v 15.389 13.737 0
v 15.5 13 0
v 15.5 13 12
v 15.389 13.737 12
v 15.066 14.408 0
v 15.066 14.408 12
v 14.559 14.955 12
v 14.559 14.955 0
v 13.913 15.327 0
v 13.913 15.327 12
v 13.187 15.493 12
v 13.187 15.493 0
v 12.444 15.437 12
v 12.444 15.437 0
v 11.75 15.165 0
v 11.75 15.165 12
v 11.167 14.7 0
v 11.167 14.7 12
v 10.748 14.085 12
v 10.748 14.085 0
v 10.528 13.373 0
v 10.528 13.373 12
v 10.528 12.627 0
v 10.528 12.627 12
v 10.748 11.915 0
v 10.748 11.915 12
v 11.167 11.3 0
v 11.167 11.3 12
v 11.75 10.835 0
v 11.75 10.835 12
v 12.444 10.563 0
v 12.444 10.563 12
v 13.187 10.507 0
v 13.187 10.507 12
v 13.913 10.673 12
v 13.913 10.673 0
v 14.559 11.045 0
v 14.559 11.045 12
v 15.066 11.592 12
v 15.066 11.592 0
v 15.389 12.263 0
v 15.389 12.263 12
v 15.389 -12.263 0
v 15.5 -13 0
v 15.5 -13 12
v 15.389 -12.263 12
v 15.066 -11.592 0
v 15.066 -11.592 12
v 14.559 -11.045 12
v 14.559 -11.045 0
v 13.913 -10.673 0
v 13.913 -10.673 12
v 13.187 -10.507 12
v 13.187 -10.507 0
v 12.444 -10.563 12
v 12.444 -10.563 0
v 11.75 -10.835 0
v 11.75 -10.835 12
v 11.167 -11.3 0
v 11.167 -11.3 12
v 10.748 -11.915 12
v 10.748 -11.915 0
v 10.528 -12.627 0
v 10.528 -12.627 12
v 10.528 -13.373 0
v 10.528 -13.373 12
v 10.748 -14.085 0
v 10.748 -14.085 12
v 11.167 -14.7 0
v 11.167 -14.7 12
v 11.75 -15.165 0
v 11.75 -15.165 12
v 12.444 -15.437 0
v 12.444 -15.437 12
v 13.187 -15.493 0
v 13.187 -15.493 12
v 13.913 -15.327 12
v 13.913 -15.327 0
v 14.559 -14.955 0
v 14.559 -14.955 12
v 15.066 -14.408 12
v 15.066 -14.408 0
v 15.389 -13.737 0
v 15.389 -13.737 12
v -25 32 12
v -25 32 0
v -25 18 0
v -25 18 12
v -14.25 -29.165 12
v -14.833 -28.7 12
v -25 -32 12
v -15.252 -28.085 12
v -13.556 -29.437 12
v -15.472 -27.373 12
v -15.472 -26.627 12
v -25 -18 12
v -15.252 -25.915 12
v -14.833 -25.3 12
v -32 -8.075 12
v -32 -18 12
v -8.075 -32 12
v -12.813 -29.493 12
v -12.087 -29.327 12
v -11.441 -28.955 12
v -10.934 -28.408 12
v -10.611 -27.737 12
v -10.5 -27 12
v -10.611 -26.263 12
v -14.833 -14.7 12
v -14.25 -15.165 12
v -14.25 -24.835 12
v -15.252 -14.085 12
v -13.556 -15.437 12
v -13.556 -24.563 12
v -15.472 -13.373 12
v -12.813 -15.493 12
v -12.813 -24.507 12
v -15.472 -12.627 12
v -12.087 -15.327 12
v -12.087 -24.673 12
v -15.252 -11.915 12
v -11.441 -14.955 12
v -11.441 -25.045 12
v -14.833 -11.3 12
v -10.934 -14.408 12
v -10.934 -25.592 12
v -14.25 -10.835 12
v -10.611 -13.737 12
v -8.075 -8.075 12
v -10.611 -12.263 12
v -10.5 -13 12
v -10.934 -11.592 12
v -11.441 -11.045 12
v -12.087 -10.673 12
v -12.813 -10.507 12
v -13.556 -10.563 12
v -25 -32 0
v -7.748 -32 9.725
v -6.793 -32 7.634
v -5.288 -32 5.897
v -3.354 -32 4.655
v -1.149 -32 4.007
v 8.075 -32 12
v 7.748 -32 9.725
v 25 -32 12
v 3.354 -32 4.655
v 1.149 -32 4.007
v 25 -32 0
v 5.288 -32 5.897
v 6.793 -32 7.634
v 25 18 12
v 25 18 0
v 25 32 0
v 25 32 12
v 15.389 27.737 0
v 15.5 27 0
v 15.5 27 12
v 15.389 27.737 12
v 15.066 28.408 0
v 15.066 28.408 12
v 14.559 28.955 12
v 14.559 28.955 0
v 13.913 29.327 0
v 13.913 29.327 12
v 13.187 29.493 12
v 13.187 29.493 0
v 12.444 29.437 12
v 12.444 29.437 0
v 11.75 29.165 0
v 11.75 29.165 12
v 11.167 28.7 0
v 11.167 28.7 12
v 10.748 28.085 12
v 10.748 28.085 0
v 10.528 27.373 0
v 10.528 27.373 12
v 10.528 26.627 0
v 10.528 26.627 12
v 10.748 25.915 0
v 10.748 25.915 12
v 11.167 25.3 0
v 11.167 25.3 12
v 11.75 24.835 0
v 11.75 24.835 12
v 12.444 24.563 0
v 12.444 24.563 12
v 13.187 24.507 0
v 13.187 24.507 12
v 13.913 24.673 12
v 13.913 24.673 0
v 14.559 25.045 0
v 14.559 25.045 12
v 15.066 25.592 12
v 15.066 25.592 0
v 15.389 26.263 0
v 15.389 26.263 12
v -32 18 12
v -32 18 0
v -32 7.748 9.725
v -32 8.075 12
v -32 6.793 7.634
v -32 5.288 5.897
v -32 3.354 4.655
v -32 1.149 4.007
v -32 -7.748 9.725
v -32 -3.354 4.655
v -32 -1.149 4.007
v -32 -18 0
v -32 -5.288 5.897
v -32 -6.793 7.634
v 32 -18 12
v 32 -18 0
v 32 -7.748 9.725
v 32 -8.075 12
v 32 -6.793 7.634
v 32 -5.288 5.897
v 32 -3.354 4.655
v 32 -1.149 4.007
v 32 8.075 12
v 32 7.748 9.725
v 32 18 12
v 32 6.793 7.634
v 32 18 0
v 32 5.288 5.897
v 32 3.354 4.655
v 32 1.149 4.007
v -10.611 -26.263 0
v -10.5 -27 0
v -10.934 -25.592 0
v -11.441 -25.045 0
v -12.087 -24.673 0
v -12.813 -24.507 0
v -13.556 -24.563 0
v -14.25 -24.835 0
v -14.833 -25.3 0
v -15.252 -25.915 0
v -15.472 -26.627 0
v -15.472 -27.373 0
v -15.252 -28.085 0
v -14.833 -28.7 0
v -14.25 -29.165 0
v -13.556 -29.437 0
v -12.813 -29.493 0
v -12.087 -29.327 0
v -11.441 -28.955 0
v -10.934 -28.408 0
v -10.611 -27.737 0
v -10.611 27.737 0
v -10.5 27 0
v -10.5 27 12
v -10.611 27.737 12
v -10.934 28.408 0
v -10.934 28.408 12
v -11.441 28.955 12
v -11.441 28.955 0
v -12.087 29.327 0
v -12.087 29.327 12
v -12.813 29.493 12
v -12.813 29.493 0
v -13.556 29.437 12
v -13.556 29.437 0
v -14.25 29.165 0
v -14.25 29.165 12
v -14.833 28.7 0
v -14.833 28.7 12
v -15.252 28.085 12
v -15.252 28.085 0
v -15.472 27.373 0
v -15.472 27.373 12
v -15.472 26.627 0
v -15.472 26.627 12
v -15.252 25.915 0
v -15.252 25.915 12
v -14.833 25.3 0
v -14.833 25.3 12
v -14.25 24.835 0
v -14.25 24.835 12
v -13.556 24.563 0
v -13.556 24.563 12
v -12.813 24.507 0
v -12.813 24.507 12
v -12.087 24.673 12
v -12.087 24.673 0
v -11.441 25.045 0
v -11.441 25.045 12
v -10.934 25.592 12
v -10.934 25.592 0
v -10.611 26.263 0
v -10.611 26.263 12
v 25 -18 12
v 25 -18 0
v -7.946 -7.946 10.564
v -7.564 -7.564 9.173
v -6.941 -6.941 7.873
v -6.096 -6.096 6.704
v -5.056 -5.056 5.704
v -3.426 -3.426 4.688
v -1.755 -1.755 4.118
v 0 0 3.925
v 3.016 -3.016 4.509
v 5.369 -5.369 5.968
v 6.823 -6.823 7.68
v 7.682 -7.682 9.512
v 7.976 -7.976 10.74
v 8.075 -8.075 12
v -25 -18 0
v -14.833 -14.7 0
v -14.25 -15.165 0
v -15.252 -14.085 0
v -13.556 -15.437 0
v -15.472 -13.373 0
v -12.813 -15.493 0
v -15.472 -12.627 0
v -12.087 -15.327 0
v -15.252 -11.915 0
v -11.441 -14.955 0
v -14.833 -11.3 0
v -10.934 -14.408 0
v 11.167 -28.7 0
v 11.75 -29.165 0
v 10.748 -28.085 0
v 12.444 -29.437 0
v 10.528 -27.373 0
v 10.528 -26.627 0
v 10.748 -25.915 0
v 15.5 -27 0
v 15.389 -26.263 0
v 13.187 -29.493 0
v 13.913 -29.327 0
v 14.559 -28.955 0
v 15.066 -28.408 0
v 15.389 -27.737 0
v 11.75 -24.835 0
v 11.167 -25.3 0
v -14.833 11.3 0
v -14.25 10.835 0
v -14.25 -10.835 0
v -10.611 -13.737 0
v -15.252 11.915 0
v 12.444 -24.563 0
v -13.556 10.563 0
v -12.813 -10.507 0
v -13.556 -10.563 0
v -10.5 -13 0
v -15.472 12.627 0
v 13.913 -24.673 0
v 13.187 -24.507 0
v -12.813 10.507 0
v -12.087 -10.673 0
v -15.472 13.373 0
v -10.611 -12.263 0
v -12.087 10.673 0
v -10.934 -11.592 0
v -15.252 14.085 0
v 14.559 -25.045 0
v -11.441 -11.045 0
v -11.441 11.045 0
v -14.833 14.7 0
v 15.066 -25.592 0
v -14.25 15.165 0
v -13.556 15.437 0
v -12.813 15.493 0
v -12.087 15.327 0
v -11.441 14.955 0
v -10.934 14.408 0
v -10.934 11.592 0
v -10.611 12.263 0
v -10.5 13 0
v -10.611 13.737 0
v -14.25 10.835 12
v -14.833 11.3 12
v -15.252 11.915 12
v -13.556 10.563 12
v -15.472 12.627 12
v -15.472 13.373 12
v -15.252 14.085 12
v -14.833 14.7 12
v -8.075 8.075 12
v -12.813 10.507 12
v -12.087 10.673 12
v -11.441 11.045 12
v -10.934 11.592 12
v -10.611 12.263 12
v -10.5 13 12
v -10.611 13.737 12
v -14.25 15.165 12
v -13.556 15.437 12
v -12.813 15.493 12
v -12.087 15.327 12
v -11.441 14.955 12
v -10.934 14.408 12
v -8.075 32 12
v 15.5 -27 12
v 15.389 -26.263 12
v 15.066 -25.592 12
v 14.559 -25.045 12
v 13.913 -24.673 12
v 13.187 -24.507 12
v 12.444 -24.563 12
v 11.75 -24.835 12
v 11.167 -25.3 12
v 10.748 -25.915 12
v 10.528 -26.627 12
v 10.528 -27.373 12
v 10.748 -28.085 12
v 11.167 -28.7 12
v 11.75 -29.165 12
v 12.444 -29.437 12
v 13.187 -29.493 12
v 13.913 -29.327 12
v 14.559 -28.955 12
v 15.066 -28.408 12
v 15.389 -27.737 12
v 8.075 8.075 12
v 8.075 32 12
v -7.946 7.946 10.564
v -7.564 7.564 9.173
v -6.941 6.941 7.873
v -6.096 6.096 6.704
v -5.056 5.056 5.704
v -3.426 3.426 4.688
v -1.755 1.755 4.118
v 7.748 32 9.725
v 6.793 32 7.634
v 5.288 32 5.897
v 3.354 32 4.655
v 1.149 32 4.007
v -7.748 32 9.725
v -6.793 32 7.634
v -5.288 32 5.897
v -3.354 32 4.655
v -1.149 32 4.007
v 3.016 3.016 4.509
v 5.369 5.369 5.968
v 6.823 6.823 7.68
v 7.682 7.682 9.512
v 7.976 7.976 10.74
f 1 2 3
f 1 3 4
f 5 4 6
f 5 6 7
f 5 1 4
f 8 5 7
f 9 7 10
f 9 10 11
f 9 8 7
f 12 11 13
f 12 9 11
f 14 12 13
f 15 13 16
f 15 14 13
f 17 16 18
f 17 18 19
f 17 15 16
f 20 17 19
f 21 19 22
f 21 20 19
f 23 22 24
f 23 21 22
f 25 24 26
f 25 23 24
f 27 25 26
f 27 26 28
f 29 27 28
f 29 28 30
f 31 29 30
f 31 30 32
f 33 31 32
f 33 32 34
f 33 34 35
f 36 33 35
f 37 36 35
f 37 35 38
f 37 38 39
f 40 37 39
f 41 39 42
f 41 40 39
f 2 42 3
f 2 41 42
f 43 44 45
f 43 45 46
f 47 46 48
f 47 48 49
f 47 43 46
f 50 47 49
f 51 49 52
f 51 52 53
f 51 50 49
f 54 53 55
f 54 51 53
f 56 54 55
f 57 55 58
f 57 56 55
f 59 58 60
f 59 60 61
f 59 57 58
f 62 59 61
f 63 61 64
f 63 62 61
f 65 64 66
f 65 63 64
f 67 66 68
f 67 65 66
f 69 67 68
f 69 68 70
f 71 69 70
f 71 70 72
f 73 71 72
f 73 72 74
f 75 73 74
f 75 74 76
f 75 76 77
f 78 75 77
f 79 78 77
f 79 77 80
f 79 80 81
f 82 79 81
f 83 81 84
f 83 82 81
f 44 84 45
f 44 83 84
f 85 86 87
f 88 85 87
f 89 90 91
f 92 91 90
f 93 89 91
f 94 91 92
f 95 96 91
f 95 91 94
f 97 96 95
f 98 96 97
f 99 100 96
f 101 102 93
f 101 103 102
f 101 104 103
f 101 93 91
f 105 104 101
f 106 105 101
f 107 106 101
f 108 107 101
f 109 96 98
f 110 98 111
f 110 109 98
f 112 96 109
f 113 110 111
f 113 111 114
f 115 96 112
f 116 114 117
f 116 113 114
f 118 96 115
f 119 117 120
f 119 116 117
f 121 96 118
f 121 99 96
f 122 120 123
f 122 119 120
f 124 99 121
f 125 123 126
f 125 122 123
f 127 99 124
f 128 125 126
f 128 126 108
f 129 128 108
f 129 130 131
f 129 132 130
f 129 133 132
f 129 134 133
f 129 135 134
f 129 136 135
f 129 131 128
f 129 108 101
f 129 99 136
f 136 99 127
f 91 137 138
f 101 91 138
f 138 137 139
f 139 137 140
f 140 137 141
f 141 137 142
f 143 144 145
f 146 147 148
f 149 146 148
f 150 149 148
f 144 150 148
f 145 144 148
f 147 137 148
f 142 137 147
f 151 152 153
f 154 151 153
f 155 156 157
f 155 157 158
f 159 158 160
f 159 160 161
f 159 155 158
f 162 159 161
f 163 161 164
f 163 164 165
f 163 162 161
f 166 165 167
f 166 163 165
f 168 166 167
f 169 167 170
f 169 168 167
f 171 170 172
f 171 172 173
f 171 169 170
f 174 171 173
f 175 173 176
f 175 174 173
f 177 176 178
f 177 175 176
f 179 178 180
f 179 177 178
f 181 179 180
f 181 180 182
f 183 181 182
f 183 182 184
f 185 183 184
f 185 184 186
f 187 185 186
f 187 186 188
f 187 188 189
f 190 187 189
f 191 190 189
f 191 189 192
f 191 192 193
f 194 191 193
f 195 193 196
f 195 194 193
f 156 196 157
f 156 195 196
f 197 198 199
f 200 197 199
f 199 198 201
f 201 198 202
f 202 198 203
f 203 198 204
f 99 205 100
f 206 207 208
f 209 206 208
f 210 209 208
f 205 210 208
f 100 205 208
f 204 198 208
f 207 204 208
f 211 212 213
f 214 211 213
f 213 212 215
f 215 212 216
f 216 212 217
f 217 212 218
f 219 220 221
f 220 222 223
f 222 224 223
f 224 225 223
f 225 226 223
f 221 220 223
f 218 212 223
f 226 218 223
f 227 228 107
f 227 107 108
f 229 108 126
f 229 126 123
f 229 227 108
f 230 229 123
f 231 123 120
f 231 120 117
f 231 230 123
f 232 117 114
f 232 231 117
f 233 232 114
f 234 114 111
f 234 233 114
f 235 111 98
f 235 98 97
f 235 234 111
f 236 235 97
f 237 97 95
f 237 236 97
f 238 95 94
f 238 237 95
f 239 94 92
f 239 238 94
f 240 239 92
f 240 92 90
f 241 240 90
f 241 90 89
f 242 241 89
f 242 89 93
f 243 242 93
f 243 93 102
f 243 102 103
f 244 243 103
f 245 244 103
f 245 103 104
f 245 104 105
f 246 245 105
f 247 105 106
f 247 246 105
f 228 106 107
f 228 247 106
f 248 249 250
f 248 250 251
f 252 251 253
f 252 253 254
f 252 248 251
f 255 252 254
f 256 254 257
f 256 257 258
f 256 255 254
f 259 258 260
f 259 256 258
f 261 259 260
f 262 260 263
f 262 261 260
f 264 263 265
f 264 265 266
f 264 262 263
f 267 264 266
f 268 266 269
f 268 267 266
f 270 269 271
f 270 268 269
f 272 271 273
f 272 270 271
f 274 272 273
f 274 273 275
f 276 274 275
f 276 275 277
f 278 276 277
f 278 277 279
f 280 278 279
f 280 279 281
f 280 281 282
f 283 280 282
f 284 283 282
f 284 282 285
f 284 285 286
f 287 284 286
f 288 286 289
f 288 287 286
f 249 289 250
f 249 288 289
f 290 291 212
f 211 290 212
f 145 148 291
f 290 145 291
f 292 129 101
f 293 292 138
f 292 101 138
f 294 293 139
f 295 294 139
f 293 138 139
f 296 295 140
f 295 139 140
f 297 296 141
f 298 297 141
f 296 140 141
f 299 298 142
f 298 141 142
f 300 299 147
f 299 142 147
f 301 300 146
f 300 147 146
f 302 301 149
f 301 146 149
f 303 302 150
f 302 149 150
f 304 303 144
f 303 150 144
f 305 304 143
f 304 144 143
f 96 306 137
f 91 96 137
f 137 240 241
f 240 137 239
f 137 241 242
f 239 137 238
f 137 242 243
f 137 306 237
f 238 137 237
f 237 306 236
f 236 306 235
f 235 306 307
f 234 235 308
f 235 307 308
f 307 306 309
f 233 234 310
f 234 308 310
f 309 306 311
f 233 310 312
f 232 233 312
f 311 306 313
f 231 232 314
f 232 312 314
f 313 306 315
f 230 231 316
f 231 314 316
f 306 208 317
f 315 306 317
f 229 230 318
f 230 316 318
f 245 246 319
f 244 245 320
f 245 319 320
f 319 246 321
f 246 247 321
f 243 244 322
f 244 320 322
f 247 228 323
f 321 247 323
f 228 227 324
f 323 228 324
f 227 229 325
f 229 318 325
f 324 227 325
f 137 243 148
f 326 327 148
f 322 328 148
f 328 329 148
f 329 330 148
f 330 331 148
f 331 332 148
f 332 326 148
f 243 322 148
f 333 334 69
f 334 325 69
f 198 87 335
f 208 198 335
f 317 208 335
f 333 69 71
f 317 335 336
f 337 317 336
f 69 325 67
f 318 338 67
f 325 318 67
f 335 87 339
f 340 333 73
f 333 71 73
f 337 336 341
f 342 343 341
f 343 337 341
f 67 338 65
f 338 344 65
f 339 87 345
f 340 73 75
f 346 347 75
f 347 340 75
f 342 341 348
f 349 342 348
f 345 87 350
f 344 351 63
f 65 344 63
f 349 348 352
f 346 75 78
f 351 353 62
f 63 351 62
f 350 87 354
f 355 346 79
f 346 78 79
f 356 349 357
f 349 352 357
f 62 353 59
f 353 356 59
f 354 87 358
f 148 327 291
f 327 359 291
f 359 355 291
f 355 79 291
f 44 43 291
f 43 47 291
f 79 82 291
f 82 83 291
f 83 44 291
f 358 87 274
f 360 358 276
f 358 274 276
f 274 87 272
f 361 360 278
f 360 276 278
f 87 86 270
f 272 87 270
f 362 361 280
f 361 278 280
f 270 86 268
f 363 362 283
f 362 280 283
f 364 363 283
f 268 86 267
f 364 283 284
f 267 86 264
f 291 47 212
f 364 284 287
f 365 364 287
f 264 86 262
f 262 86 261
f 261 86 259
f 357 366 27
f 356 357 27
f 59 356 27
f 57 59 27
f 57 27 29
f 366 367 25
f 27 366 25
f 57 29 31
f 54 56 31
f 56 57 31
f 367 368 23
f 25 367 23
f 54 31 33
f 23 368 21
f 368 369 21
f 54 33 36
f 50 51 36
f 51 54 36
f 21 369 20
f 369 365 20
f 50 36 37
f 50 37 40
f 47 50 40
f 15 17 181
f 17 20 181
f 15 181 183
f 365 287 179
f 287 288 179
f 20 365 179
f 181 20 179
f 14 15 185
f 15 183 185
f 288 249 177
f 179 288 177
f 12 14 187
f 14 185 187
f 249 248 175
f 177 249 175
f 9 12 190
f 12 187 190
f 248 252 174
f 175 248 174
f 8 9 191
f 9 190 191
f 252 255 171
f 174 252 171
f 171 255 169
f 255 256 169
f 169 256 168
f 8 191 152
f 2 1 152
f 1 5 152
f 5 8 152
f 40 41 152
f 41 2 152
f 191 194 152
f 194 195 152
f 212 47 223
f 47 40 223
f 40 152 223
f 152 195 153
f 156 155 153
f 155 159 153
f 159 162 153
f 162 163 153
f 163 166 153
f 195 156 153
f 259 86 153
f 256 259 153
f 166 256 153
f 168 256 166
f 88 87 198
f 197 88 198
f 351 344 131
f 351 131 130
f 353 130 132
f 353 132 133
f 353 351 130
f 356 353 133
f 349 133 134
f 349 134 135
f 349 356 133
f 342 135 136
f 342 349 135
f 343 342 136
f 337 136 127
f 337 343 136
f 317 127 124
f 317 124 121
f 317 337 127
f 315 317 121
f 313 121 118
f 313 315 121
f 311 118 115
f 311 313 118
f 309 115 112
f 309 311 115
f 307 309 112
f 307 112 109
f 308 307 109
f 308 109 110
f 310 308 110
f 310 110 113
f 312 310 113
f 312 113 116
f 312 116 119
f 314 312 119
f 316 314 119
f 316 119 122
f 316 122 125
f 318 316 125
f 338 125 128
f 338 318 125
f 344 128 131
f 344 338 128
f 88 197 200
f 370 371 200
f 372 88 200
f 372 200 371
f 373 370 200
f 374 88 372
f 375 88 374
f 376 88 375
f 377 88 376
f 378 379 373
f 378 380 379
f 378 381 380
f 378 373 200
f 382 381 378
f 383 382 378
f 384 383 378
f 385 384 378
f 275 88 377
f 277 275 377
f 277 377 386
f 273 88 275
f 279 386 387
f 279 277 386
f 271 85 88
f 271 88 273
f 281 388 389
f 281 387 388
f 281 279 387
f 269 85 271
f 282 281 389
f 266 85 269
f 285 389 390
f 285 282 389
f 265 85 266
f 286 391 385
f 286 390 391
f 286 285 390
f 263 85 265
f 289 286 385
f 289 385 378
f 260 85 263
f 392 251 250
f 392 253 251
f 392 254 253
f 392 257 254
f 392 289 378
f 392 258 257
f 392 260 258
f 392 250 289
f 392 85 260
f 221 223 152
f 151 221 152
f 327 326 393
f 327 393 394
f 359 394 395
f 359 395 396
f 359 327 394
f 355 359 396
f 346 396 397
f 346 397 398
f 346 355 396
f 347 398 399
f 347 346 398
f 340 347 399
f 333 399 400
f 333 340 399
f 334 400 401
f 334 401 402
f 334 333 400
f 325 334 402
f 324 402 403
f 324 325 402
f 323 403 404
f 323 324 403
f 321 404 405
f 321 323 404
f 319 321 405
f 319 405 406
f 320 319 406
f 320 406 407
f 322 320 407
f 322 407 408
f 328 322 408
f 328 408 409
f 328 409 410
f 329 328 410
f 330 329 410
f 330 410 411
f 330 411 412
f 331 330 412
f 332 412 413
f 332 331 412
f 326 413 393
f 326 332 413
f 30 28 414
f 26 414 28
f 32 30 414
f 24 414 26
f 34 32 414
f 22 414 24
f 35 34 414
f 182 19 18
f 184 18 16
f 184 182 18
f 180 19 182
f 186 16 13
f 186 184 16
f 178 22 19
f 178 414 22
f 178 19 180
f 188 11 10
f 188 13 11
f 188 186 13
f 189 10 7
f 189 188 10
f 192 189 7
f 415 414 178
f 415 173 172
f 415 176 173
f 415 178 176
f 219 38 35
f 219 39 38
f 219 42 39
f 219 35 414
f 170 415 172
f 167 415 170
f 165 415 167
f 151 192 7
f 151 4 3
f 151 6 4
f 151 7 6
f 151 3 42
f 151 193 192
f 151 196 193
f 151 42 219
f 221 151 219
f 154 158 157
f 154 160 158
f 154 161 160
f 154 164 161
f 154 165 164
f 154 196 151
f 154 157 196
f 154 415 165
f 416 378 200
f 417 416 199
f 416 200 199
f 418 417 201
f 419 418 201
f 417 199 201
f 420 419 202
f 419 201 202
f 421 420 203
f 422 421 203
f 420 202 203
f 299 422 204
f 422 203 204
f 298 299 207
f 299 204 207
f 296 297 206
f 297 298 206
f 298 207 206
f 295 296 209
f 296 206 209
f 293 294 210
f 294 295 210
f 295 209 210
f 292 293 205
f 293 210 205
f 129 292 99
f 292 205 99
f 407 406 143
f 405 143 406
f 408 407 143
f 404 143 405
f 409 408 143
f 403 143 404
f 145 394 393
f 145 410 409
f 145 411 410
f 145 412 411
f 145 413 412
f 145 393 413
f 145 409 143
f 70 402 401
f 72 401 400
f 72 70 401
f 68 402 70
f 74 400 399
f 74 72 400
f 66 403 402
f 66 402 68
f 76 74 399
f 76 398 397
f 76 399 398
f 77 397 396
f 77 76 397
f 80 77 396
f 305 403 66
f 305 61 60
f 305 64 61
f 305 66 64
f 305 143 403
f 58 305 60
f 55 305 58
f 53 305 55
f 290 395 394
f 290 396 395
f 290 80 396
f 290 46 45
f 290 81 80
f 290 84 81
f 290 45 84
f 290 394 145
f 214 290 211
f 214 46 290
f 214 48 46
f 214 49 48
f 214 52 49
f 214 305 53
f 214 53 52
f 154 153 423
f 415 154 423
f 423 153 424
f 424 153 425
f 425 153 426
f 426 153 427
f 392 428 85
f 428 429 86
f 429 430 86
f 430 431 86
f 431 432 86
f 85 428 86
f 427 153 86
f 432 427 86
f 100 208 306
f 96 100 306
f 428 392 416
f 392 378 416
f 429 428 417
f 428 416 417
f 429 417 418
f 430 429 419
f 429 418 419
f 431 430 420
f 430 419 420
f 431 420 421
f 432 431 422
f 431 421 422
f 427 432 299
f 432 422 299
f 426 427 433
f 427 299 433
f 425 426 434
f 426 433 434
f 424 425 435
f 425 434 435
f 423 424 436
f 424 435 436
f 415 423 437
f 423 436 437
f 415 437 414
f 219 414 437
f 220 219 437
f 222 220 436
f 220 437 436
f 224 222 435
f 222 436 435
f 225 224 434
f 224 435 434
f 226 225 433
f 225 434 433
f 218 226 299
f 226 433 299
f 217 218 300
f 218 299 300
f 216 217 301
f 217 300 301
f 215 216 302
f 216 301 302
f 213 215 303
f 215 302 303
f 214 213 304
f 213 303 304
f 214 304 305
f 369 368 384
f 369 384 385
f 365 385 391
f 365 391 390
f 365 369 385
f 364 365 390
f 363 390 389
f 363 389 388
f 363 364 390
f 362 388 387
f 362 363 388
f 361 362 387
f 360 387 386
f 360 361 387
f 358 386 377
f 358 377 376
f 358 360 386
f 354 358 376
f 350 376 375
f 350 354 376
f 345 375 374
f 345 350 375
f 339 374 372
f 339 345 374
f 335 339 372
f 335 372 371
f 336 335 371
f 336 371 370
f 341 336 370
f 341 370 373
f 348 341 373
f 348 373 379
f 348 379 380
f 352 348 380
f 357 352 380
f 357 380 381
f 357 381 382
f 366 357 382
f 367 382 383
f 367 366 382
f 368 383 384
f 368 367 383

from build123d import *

# Parameters (mm, degrees)
F0_R     = 2.5
F1_DEPTH = 12
F0_W     = 7
F0_H     = 14
F2_DEPTH = 12.001
F3_R     = 8.075
F4_DEPTH = 64.001
F6_DEPTH = 64.001


with BuildPart() as f1:
    # F0 (on Top) → F1 (new body)
    with BuildSketch(Plane.XY):
        Polygon((-25, -32), (25, -32), (25, -18), (32, -18), (32, 18), (25, 18), (25, 32), (-25, 32), (-25, 18), (-32, 18), (-32, -18), (-25, -18), align=None)
        with Locations((-13, -27)):
            Circle(F0_R, mode=Mode.SUBTRACT)
        with Locations((-13, -13)):
            Circle(F0_R, mode=Mode.SUBTRACT)
        with Locations((13, -27)):
            Circle(F0_R, mode=Mode.SUBTRACT)
        with Locations((13, -13)):
            Circle(F0_R, mode=Mode.SUBTRACT)
        with Locations((-13, 13)):
            Circle(F0_R, mode=Mode.SUBTRACT)
        with Locations((-13, 27)):
            Circle(F0_R, mode=Mode.SUBTRACT)
        with Locations((13, 13)):
            Circle(F0_R, mode=Mode.SUBTRACT)
        with Locations((13, 27)):
            Circle(F0_R, mode=Mode.SUBTRACT)
    extrude(amount=F1_DEPTH)

    # F0 (on Top) → F2 (cut, through all)
    with BuildSketch(Plane.XY):
        with Locations((28.5, -25)):
            Rectangle(F0_W, F0_H)
        with Locations((-28.5, -25)):
            Rectangle(F0_W, F0_H)
    extrude(amount=F2_DEPTH, mode=Mode.SUBTRACT)

    # F3 (on face) → F4 (cut, through all)
    with BuildSketch(Plane.XZ.offset(32)):
        with Locations((0, 12)):
            Circle(F3_R)
    extrude(amount=-F4_DEPTH, mode=Mode.SUBTRACT)

    # F5 (on face) → F6 (cut, through all)
    with BuildSketch(Plane(origin=(-32, 0, 0), x_dir=(0, -1, 0), z_dir=(-1, 0, 0))):
        with BuildLine():
            ThreePointArc((-8.075, 12), (0, 3.925), (8.075, 12))
            Line((8.075, 12), (-8.075, 12))
        make_face()
    extrude(amount=-F6_DEPTH, mode=Mode.SUBTRACT)


solid = f1.part
